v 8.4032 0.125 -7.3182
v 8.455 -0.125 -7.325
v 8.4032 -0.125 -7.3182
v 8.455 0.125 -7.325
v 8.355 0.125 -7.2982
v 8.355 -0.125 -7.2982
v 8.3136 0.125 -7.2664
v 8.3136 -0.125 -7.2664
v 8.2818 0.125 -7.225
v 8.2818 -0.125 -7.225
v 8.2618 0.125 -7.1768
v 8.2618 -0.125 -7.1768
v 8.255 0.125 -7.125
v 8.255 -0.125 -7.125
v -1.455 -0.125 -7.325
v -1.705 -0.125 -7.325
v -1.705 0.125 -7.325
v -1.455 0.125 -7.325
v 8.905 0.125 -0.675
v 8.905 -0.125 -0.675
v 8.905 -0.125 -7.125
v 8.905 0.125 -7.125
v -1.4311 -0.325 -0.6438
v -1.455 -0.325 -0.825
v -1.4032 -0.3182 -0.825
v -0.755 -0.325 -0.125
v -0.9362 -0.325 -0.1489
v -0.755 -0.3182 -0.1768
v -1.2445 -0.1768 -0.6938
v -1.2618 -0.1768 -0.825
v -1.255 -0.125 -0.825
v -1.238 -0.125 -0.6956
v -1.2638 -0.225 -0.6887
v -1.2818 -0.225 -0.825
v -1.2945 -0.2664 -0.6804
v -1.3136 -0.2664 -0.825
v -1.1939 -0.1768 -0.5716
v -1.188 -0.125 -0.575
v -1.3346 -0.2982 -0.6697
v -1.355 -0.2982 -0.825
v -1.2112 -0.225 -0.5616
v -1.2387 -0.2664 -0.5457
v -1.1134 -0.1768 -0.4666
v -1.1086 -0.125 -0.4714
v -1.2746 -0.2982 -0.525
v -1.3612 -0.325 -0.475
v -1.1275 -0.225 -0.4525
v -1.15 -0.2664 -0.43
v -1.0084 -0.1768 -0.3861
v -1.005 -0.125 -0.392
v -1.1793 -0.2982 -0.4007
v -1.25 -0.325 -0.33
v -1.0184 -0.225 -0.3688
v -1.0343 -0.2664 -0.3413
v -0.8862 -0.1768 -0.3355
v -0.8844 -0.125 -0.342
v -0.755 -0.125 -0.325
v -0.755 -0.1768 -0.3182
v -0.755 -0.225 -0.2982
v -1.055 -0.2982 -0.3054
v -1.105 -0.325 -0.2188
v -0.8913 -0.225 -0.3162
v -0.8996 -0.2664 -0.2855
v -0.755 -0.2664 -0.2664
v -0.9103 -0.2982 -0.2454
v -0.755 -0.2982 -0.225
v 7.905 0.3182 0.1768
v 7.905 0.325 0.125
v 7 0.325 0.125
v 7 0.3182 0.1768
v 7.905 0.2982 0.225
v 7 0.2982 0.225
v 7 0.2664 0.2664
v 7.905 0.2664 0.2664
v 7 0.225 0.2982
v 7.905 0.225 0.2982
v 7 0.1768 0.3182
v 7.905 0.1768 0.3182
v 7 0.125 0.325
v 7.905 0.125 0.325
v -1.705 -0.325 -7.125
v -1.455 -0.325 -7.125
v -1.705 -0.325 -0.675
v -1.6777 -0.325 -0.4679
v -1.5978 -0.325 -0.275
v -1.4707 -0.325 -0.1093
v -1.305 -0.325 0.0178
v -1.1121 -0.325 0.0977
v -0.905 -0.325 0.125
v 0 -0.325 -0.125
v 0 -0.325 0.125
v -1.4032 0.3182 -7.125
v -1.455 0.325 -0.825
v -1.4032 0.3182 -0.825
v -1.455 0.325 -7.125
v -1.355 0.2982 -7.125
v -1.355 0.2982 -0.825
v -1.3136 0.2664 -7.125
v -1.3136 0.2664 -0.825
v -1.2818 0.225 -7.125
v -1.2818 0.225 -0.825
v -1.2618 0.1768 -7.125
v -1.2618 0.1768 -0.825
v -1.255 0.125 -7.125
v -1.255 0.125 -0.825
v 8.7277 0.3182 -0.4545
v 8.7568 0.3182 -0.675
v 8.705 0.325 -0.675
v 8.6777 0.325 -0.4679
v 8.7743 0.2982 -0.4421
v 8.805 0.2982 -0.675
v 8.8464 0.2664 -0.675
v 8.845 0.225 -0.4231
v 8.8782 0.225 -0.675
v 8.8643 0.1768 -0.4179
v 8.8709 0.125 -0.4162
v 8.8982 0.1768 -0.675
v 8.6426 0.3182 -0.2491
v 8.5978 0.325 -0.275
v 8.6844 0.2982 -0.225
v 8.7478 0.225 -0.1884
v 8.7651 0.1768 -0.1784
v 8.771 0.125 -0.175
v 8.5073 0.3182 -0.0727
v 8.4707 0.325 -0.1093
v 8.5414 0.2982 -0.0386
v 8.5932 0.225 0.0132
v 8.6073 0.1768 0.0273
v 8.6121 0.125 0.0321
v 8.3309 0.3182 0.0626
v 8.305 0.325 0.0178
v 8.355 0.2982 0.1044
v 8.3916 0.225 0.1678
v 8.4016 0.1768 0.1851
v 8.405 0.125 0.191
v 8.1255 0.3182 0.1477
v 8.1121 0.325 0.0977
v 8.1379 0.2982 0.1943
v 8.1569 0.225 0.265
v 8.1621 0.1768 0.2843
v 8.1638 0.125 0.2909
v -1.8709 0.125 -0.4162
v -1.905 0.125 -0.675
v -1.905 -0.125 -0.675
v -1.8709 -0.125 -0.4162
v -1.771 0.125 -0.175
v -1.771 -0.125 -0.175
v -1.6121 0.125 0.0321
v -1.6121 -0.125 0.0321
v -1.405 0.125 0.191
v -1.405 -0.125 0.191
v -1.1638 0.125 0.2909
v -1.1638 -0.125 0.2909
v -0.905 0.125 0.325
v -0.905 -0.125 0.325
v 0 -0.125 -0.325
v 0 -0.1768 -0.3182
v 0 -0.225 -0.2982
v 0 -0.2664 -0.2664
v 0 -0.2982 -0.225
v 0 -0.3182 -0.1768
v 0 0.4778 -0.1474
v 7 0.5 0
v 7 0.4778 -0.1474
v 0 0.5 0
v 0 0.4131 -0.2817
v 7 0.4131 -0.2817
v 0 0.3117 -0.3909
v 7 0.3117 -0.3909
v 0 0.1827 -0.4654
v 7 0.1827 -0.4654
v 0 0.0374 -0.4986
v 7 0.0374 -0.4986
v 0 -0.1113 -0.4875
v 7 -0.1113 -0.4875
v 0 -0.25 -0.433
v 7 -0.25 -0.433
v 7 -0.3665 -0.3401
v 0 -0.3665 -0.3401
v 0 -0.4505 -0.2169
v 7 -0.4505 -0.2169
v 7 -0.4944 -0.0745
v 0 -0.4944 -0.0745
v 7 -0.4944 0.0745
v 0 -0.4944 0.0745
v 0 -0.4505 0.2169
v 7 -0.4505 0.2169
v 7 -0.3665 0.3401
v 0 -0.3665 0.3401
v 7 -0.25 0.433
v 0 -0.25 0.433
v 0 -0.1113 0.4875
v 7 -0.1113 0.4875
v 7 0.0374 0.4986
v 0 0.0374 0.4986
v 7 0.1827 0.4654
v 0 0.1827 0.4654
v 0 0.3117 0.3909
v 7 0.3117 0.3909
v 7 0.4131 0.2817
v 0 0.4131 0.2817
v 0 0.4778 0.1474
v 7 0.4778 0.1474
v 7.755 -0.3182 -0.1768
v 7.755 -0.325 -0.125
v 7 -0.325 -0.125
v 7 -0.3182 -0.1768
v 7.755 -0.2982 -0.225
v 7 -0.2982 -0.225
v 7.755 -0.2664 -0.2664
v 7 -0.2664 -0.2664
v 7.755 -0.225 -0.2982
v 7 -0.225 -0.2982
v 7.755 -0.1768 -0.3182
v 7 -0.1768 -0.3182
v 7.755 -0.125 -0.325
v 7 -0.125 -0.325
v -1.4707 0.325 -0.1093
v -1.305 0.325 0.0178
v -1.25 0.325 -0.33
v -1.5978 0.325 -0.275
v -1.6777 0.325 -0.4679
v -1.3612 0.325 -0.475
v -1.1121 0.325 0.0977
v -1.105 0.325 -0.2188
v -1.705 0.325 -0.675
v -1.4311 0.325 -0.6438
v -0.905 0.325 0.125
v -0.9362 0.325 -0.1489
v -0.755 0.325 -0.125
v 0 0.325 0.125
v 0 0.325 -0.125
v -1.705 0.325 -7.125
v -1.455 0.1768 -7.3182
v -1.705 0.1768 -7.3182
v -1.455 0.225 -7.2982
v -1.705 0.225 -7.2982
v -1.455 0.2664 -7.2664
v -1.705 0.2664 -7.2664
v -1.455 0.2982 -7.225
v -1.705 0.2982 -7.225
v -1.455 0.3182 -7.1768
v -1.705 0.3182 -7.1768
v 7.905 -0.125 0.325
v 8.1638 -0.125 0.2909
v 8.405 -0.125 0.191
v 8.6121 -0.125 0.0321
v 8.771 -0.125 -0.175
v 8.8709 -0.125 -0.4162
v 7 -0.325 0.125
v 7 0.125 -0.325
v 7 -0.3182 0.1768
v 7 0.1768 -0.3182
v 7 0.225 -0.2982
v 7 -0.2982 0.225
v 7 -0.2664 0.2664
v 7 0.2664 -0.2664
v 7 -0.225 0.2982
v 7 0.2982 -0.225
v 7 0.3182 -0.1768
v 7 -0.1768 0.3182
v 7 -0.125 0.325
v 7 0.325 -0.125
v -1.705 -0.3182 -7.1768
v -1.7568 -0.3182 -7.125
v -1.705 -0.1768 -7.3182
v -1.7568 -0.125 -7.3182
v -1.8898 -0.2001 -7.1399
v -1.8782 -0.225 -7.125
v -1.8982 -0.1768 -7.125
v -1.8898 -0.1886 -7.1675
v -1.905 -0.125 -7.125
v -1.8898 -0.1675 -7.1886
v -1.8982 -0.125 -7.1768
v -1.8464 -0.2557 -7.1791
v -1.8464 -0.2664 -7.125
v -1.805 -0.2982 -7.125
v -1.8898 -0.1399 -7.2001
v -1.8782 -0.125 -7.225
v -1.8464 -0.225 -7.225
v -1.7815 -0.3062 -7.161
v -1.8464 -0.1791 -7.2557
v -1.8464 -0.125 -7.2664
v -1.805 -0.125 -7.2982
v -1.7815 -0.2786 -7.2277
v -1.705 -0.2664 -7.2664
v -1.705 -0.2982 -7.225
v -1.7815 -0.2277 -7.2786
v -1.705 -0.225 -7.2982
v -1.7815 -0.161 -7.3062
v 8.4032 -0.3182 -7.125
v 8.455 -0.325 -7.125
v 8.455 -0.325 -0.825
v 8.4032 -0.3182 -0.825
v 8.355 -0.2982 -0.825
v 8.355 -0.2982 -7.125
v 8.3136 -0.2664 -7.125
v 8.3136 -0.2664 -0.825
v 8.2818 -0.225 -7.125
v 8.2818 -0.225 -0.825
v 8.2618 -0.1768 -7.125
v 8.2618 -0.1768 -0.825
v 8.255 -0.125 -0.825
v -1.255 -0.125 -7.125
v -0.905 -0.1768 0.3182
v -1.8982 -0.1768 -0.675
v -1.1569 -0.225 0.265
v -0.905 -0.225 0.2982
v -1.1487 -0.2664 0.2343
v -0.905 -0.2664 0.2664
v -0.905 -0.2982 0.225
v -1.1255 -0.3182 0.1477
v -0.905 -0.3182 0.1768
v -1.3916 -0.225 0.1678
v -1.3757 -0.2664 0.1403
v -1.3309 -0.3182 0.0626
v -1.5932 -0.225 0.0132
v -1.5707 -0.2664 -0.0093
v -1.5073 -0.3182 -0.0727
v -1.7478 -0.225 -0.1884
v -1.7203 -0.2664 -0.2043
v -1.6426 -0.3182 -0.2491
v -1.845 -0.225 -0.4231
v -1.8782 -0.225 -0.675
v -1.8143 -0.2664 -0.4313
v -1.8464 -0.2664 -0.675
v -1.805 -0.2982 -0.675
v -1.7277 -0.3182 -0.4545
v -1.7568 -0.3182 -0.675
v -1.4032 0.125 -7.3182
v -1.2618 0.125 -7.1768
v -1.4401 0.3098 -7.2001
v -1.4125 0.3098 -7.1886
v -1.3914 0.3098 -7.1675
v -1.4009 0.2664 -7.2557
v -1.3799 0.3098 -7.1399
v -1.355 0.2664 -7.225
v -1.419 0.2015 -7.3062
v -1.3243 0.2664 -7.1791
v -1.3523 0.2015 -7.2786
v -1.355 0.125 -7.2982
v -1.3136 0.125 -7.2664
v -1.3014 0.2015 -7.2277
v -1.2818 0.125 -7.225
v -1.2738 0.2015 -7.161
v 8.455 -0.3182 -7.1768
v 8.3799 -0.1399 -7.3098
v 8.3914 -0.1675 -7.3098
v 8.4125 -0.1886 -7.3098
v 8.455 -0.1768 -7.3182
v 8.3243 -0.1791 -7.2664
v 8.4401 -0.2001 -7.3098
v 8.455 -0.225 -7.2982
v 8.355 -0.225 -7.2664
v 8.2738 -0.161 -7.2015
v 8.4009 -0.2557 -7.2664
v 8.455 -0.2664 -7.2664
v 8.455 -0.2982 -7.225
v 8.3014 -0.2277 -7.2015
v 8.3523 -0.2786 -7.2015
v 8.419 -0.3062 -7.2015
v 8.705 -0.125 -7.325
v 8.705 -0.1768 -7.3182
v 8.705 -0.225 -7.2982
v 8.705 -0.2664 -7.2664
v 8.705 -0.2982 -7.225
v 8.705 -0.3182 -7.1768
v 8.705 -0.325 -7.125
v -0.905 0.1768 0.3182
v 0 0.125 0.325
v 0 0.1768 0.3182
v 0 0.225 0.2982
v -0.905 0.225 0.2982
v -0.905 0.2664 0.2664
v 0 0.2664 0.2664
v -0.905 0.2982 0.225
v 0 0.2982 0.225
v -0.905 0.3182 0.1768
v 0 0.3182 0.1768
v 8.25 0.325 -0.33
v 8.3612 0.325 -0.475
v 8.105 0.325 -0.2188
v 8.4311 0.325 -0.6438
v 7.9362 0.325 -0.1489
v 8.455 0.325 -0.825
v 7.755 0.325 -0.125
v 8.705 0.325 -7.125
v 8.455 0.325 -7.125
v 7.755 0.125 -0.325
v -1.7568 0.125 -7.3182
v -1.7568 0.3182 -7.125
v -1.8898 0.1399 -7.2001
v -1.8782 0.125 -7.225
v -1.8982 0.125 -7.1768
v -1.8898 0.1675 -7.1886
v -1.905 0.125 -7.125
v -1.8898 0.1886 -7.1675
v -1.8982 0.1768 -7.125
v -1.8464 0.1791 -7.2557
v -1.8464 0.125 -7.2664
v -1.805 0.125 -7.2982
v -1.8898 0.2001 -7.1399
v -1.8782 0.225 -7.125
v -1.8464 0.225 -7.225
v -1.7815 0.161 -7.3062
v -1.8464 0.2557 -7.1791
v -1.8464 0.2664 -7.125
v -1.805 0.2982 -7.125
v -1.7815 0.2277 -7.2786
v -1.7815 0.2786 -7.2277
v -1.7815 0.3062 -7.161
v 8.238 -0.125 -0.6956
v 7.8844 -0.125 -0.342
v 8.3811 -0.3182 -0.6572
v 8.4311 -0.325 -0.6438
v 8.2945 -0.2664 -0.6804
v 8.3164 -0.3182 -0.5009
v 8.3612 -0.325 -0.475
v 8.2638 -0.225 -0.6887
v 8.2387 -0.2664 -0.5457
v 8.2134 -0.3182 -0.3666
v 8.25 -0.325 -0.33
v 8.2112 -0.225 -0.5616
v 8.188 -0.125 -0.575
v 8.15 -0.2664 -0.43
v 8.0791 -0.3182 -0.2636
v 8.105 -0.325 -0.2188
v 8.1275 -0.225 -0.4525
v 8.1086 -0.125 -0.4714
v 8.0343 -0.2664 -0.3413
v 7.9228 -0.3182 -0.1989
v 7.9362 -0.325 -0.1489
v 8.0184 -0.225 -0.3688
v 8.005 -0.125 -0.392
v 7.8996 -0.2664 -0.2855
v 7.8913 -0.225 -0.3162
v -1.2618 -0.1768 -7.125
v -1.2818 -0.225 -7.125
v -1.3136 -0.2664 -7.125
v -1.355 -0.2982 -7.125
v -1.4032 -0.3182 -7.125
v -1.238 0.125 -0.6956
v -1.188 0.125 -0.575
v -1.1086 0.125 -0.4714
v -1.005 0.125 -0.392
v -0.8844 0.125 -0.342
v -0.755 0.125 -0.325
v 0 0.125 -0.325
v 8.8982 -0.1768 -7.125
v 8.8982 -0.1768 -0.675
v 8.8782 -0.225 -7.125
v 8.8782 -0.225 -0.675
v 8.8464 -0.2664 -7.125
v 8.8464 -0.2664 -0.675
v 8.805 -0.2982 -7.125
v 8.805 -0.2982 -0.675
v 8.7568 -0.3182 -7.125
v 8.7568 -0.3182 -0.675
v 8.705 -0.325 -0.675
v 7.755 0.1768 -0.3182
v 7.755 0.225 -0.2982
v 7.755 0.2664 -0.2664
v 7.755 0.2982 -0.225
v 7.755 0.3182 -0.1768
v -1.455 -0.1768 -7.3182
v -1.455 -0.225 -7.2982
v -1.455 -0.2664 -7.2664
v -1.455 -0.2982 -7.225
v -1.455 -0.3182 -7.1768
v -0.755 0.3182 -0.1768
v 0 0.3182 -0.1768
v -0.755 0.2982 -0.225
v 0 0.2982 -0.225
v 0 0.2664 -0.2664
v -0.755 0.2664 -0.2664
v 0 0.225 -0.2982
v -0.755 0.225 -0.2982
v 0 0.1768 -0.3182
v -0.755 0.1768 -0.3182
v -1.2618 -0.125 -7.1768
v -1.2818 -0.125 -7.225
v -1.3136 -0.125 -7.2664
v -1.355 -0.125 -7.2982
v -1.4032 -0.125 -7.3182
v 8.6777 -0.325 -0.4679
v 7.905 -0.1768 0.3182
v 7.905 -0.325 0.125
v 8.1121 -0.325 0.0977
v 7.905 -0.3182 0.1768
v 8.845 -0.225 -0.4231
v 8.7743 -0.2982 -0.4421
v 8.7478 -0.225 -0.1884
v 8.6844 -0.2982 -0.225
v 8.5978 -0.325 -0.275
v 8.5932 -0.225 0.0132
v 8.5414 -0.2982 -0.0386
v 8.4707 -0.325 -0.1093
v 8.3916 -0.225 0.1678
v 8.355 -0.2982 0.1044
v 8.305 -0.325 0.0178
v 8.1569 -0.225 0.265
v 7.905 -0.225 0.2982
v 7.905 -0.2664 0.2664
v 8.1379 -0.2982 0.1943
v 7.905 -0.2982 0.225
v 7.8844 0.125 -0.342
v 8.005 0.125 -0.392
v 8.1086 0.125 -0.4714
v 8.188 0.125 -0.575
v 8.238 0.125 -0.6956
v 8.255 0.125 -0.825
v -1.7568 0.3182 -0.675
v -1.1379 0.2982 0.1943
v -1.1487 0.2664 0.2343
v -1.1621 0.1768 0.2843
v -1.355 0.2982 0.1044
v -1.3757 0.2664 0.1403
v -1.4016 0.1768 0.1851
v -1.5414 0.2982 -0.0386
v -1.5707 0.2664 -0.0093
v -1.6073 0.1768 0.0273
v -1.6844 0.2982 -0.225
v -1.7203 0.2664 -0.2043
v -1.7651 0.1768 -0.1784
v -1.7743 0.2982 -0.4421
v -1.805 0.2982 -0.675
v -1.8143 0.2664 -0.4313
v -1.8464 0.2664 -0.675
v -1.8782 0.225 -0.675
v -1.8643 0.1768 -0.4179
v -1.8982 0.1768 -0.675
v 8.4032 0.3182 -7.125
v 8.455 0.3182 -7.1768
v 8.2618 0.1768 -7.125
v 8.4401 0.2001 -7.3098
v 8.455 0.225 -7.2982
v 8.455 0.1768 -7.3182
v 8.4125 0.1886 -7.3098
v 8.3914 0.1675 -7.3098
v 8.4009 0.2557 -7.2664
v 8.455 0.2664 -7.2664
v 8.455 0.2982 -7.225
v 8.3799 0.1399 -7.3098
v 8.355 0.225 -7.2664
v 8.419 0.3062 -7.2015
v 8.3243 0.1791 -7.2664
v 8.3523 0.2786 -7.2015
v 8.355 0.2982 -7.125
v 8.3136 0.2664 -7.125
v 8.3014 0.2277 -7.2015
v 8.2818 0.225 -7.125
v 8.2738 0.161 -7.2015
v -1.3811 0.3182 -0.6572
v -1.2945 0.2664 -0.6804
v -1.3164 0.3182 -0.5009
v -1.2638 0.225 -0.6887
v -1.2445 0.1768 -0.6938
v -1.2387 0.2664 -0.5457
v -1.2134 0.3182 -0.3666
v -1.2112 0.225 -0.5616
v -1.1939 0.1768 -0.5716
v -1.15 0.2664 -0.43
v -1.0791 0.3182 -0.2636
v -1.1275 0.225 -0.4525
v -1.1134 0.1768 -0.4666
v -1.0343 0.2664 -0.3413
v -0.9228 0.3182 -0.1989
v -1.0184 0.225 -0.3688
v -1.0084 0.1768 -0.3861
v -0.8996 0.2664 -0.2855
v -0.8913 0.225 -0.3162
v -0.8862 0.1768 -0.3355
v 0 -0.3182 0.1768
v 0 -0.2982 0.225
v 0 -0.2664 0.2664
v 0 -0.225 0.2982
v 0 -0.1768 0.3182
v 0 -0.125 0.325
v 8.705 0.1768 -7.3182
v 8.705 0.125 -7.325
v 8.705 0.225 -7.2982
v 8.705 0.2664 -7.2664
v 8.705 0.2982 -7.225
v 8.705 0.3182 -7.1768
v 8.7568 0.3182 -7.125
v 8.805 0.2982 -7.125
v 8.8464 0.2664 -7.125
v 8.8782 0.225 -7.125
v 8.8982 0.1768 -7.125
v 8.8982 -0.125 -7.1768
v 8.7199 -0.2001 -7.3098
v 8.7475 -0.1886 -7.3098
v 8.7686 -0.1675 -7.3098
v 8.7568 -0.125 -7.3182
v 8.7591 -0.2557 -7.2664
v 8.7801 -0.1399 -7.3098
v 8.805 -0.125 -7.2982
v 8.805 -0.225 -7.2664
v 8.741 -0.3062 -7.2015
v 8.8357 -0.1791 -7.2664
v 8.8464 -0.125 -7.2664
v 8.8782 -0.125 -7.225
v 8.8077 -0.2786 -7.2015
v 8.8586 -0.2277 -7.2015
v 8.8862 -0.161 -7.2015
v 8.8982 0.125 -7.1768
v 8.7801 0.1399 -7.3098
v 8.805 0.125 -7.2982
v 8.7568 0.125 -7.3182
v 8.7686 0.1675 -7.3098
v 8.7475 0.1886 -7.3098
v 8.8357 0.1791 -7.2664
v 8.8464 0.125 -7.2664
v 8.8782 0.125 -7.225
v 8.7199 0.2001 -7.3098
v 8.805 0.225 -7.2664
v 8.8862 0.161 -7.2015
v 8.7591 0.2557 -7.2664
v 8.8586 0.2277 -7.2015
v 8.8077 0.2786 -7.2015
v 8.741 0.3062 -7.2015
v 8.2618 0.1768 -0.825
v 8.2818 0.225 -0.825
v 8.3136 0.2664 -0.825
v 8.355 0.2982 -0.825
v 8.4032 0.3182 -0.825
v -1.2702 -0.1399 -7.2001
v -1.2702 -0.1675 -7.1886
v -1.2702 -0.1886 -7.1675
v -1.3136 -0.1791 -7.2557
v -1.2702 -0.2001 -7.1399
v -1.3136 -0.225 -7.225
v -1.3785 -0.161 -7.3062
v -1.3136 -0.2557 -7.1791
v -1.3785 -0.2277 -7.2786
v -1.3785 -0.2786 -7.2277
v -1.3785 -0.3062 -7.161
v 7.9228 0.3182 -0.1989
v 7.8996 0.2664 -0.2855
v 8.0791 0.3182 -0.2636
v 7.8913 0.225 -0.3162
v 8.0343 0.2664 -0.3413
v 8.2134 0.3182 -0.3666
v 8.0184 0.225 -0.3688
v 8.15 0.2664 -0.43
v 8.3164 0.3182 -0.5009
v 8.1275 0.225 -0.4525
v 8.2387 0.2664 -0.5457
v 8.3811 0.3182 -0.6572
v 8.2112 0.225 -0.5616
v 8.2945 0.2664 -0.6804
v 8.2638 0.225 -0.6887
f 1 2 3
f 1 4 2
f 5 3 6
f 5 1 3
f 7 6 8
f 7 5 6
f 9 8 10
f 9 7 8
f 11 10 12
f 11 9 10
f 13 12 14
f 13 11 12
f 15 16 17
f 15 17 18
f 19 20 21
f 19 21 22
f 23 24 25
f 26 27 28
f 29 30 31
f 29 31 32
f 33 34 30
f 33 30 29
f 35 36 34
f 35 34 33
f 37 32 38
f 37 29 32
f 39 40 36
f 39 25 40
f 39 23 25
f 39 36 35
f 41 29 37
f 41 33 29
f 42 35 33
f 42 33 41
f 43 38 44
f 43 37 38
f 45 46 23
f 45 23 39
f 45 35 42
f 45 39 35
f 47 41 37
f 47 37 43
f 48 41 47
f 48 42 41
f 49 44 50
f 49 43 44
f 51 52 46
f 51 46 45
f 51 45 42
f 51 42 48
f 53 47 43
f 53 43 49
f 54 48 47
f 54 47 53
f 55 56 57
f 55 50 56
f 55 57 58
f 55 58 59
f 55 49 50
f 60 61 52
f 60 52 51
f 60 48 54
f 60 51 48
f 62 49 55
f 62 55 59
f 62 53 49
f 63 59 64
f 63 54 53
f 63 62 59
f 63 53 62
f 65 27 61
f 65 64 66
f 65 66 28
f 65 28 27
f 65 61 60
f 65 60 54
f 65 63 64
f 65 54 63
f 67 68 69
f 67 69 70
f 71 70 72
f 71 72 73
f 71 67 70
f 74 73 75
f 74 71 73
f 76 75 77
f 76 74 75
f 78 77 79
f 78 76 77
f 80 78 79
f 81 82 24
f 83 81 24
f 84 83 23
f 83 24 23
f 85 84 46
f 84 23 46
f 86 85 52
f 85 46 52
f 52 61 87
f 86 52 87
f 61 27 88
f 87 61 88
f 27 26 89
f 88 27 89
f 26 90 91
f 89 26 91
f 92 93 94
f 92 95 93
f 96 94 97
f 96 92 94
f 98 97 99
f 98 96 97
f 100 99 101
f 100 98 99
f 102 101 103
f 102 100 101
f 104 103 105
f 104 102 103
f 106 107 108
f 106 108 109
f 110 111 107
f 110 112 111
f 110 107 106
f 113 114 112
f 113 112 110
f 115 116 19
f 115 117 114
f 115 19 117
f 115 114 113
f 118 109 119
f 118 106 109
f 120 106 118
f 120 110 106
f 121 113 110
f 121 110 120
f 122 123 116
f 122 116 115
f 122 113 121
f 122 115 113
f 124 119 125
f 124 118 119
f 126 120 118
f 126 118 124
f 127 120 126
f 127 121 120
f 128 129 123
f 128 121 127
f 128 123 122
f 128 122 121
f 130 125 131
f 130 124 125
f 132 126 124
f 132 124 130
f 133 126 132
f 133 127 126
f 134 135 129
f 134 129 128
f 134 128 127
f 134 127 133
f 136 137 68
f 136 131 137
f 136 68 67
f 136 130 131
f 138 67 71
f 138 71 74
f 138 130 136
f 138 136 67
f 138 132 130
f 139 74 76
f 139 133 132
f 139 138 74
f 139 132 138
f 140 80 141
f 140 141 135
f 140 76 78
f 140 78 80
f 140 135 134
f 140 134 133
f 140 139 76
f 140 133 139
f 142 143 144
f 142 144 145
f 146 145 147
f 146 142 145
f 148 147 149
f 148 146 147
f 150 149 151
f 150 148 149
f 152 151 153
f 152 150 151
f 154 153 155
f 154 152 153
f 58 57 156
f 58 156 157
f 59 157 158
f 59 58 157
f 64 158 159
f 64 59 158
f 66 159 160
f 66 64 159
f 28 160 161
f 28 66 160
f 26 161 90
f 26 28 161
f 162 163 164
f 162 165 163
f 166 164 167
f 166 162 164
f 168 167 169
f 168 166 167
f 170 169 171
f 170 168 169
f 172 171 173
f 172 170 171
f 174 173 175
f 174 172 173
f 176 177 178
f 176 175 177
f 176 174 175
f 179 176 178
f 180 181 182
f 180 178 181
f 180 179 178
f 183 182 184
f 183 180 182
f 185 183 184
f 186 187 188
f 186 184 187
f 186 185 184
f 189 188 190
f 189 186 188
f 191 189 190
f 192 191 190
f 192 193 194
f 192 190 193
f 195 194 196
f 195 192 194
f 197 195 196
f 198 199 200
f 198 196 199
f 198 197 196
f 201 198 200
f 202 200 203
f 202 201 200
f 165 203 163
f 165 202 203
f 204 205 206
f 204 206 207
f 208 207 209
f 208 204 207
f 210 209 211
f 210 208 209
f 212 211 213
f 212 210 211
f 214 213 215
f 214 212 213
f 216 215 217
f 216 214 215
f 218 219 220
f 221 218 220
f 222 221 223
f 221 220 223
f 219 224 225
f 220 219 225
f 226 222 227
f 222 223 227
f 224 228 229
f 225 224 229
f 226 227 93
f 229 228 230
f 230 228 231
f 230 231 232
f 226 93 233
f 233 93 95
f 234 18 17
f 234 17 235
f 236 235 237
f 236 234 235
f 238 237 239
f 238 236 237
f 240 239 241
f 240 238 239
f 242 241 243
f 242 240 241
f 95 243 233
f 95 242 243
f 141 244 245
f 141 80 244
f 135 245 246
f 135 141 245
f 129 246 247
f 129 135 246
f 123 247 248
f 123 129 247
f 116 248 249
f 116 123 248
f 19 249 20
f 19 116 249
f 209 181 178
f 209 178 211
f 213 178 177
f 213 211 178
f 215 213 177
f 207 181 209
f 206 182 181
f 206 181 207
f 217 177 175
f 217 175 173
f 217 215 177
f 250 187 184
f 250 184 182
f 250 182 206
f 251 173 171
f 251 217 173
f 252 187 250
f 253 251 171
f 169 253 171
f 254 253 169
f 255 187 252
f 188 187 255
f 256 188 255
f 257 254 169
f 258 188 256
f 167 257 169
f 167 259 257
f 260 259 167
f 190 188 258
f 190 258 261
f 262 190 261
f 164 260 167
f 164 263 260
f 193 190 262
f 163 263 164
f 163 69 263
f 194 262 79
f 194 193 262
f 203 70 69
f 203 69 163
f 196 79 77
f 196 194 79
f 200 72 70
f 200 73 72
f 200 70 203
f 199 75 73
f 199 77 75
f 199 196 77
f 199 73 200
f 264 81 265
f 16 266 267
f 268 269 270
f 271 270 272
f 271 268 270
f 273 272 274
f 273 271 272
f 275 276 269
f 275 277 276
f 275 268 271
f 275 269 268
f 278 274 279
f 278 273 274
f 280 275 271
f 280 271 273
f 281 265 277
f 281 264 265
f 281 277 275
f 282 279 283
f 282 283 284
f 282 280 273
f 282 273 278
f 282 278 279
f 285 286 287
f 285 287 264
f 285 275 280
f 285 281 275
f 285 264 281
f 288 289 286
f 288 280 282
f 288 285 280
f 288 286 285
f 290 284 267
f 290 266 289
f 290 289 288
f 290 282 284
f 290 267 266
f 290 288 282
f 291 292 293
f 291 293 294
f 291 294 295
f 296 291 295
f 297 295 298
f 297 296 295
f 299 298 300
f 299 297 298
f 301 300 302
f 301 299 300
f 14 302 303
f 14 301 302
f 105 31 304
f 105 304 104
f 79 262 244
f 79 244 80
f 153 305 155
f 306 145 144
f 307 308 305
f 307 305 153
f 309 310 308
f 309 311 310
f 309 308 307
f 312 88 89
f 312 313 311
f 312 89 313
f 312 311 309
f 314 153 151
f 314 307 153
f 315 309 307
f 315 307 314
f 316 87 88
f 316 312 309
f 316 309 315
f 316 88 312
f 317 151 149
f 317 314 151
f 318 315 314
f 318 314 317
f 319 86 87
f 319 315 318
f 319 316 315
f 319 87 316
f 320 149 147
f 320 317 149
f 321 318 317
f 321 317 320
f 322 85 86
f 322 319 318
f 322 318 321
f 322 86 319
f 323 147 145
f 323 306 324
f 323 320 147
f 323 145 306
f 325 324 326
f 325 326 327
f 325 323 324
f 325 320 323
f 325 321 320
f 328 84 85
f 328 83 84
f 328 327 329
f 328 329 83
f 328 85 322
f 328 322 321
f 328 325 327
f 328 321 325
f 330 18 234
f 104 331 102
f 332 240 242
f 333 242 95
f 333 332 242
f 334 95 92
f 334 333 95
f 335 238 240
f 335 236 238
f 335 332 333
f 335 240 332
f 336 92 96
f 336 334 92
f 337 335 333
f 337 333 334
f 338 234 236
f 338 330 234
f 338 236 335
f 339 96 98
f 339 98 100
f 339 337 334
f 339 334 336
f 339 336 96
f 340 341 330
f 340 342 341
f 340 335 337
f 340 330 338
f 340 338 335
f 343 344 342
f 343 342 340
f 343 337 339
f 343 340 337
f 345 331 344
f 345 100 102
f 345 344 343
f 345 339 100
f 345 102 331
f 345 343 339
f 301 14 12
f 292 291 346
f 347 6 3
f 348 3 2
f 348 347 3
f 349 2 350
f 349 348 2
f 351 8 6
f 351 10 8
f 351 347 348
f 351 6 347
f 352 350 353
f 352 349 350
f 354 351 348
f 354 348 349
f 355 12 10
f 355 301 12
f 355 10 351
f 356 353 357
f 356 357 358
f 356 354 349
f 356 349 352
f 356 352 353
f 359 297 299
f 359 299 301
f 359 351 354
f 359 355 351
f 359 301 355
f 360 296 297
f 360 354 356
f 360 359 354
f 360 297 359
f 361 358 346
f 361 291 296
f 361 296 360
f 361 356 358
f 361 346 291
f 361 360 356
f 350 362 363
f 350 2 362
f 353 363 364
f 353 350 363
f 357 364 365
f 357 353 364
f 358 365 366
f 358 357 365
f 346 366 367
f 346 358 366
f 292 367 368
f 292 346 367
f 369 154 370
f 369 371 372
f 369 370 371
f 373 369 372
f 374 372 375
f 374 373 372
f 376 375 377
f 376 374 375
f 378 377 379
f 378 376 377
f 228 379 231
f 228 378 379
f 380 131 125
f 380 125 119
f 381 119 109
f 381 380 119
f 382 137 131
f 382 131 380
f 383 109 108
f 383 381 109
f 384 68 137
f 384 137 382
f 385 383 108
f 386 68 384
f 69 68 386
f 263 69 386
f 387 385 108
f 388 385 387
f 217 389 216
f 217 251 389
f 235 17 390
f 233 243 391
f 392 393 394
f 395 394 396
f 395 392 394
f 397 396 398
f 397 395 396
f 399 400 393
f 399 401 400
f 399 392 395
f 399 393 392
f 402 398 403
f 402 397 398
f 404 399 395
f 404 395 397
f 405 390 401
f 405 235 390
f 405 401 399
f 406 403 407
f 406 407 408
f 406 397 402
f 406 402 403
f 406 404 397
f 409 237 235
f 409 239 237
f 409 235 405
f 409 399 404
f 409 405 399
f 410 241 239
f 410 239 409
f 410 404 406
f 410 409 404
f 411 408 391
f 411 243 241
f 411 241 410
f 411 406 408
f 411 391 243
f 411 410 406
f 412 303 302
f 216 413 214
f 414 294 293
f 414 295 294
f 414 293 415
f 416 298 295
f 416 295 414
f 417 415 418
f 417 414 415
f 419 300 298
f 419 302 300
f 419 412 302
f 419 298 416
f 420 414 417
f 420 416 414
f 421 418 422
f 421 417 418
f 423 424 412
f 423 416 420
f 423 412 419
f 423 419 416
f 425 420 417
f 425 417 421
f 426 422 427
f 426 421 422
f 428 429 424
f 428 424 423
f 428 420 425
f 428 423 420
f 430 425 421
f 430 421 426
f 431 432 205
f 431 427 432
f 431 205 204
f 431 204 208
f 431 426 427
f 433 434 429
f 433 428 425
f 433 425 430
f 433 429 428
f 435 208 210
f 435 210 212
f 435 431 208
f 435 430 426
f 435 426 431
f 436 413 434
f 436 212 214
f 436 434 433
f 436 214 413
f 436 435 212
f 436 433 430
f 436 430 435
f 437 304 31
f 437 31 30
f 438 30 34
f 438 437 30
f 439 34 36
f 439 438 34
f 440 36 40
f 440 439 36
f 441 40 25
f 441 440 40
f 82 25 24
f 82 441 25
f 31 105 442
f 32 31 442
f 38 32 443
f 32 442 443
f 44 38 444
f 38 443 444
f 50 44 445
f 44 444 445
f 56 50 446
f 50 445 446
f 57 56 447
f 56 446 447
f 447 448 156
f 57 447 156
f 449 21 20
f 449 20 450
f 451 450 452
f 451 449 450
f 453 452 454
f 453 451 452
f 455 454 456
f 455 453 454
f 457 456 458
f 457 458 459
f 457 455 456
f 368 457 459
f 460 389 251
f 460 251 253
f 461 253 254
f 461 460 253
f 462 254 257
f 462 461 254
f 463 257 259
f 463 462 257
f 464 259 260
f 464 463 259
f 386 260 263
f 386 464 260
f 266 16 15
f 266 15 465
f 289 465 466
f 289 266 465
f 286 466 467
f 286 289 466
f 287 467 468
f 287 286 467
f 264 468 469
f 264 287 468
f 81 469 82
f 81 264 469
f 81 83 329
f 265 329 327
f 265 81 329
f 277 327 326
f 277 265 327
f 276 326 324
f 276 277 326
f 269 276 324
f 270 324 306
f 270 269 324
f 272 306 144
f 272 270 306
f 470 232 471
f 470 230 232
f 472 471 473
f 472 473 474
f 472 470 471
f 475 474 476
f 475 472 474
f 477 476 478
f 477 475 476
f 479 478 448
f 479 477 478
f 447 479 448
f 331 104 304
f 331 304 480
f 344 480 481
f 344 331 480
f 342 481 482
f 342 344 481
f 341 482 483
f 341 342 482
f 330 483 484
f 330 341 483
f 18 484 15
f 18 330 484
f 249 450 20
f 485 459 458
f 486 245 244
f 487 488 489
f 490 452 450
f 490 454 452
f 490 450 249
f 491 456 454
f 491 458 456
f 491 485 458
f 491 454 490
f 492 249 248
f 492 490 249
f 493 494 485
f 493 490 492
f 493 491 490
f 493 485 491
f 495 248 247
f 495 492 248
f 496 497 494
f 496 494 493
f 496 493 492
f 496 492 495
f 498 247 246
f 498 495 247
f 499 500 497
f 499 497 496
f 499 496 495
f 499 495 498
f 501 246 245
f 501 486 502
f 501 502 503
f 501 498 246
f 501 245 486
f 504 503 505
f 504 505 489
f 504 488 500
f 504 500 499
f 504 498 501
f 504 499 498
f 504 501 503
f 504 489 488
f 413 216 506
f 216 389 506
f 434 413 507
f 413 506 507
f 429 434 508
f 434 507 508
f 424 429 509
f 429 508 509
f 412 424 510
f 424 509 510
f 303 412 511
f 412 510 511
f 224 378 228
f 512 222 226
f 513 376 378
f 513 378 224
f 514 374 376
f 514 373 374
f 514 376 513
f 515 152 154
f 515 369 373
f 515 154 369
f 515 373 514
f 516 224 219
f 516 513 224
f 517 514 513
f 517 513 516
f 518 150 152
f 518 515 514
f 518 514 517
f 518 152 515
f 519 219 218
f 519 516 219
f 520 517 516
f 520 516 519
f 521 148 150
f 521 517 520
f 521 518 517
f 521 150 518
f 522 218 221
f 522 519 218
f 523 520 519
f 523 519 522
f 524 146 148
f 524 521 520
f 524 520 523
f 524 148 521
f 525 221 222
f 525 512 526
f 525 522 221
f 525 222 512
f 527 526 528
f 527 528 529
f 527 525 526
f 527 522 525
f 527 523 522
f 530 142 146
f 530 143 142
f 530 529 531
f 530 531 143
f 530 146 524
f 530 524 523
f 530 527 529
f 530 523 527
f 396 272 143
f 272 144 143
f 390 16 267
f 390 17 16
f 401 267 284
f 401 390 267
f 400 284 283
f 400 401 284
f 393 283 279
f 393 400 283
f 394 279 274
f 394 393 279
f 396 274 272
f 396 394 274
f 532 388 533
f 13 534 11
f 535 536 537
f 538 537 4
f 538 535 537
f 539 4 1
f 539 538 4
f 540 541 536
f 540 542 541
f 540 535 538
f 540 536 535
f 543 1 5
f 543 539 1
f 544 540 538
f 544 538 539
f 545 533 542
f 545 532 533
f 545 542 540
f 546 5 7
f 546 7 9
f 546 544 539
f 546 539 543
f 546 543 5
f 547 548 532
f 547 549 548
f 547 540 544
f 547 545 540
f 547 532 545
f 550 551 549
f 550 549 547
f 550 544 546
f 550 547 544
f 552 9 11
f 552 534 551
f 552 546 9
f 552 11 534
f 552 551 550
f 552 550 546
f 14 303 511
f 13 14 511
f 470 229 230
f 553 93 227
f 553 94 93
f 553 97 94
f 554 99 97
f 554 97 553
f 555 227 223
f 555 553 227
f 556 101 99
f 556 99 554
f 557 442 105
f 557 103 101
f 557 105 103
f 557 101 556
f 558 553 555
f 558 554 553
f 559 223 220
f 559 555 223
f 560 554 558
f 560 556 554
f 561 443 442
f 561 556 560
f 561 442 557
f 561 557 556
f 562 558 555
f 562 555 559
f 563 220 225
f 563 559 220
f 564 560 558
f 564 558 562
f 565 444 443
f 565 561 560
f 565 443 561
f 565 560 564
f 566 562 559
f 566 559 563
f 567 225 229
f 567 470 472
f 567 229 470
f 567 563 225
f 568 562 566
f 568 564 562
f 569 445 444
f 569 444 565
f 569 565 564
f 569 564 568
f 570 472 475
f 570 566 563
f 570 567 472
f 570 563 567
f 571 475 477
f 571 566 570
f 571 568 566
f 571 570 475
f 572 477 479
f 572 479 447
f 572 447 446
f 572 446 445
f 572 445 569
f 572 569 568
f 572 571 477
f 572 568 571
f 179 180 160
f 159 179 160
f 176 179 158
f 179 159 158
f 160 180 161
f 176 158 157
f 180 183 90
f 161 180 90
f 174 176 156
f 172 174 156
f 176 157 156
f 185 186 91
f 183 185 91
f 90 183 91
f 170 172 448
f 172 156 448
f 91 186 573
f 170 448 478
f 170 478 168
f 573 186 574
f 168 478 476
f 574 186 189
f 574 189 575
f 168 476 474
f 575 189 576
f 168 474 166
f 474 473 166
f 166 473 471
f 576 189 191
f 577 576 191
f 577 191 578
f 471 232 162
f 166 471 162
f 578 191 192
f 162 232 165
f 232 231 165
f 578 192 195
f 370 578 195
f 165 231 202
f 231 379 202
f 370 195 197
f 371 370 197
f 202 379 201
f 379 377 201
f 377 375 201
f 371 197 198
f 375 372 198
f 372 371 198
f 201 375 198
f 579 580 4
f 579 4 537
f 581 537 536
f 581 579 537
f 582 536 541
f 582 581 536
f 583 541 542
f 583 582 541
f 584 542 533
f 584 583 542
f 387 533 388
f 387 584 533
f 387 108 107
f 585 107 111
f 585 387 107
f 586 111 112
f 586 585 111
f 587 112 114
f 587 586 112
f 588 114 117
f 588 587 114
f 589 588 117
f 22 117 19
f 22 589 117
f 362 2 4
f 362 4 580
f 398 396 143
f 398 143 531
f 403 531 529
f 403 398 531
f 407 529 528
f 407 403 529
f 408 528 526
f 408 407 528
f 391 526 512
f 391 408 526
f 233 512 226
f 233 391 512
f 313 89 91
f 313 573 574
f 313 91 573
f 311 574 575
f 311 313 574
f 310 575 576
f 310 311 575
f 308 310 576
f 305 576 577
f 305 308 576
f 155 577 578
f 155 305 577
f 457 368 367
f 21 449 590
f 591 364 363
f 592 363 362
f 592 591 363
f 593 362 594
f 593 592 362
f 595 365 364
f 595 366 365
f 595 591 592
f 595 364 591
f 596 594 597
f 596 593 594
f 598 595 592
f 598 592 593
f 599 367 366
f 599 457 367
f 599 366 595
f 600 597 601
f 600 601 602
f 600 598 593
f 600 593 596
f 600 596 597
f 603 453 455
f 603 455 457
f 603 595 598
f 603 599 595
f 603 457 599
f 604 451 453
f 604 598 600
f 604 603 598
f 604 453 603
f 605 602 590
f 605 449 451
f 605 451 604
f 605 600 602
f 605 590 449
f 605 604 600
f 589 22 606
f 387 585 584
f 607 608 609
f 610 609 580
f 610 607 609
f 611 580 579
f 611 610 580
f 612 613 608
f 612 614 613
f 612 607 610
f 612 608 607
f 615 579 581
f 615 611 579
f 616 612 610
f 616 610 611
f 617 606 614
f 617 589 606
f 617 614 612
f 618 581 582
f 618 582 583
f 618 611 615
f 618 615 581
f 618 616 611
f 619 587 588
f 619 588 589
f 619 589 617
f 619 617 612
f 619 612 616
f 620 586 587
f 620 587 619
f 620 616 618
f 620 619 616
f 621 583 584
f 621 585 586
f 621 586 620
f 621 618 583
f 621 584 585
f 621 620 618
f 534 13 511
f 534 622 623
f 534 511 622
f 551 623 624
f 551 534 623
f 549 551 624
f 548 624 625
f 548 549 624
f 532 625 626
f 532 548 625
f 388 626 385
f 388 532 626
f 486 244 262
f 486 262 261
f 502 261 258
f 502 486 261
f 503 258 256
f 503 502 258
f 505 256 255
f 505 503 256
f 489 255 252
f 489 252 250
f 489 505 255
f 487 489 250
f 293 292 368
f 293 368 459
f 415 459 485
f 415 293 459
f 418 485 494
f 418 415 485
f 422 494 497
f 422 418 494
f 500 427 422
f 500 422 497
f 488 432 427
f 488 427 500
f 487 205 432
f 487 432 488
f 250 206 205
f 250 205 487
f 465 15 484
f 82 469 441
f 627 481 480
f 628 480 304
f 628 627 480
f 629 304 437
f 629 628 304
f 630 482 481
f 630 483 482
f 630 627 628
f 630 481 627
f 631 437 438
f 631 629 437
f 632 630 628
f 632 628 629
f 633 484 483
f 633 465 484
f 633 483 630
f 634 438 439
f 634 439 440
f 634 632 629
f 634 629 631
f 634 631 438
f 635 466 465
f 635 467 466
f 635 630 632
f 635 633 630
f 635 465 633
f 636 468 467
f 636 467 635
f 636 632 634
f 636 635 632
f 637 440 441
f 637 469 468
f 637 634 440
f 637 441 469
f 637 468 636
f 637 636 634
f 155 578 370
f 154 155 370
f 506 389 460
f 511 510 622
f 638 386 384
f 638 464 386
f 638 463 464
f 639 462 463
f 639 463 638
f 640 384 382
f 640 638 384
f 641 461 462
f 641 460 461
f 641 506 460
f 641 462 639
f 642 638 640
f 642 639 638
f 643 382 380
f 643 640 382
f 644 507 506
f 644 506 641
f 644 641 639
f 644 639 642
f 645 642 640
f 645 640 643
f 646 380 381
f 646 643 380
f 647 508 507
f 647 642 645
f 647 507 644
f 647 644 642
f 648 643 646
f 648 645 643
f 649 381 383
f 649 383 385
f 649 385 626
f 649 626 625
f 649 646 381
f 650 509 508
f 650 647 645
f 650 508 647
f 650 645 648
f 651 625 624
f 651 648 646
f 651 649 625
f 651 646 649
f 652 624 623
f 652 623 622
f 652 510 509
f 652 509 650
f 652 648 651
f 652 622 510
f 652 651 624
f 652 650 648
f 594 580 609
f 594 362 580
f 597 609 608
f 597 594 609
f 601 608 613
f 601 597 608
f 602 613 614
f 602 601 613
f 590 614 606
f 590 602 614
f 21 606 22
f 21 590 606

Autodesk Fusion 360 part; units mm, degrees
sketch "Sketch1" plane through (0, 0, 0) normal (1, 0, 0) x (0, 1, 0)
  circle A0 centre (0, 0) radius 0.5
  line L0 (0.325, -0.325) -> (-0.325, -0.325)
  line L1 (-0.325, -0.325) -> (-0.325, 0.325)
  line L2 (-0.325, 0.325) -> (0.325, 0.325)
  line L3 (0.325, 0.325) -> (0.325, -0.325)
  line L4 (0.325, -0.325) -> (-0.325, 0.325) construction
  line L5 (-0.325, -0.325) -> (0.325, 0.325) construction
  dimension "d1" = 1
  dimension "d2" = 0.65
  dimension "d3" = 0.65
extrude "Extrude1" add sketch "Sketch1" along normal blind 7 contours A0 | L0 L1 L2 L3
sketch "Sketch2" plane through (7, 0, 0) normal (1, 0, 0) x (0, 1, 0)
  circle A0 centre (0, 0) radius 0.5
  line L0 (0.325, -0.325) -> (-0.325, -0.325)
  line L1 (-0.325, -0.325) -> (-0.325, 0.325)
  line L2 (-0.325, 0.325) -> (0.325, 0.325)
  line L3 (0.325, 0.325) -> (0.325, -0.325)
  line L4 (0.325, -0.325) -> (-0.325, 0.325) construction
  line L5 (-0.325, -0.325) -> (0.325, 0.325) construction
  dimension "d8" = 0.65
  dimension "d9" = 0.65
extrude "Extrude2" add sketch "Sketch2" along normal blind 1.905 contours L0 L1 L2 L3
extrude "Extrude3" add sketch "Sketch1" against normal blind 1.905 contours L0 L1 L2 L3
sketch "Sketch3" plane through (0, 0, -0.325) normal (0, 0, -1) x (1, 0, 0)
  line L0 (7, 0.325) -> (7, -0.325)
  line L1 (7, -0.325) -> (8.905, -0.325)
  line L2 (8.905, -0.325) -> (8.905, 0.325)
  line L3 (8.905, 0.325) -> (7, 0.325)
  line L4 (8.905, 0.325) -> (8.255, 0.325)
  line L5 (8.255, 0.325) -> (8.255, -0.325)
  line L6 (8.255, -0.325) -> (8.905, -0.325)
  line L7 (8.905, -0.325) -> (8.905, 0.325)
  line L8 (8.905, 0.325) -> (8.255, -0.325) construction
  line L9 (8.255, 0.325) -> (8.905, -0.325) construction
  point P0 (8.58, 0)
  dimension "d14" = 0.65
  dimension "d15" = 0.65
sketch "Sketch4" plane through (0, 0, -0.325) normal (0, 0, -1) x (1, 0, 0)
  line L0 (0, -0.325) -> (0, 0.325)
  line L1 (0, 0.325) -> (-1.905, 0.325)
  line L2 (-1.905, 0.325) -> (-1.905, -0.325)
  line L3 (-1.905, -0.325) -> (0, -0.325)
  line L4 (-1.255, -0.325) -> (-1.905, -0.325)
  line L5 (-1.905, -0.325) -> (-1.905, 0.325)
  line L6 (-1.905, 0.325) -> (-1.255, 0.325)
  line L7 (-1.255, 0.325) -> (-1.255, -0.325)
  line L8 (-1.255, -0.325) -> (-1.905, 0.325) construction
  line L9 (-1.905, -0.325) -> (-1.255, 0.325) construction
  point P0 (-1.58, 0)
  dimension "d17" = 0.65
  dimension "d18" = 0.65
extrude "Extrude4" add sketch "Sketch4" sketch "Sketch3" along normal blind 7 contours L1 L2 L3 L4 L5 L6 L7 of sketch 2 contours L1 L2 L3 L4 L5 L6 L7
fillet "Fillet1" radius 0.5 2 edges at (-1.255, 0, -0.325) (8.255, 0, -0.325)
fillet "Fillet2" radius 1 2 edges at (-1.905, 0, 0.325) (8.905, 0, 0.325)
fillet "Fillet3" radius 0.2 32 edges at (-1.58, -0.325, -7.325) (-1.255, 0, -7.325) (-1.58, 0.325, -7.325) (-1.905, 0, -7.325) (-1.1086, -0.325, -0.4714) (-1.255, -0.325, -4.075) (-0.3775, -0.325, -0.325) (-0.4525, -0.325, 0.325) (-1.6121, -0.325, 0.0321) (-1.905, -0.325, -4) (-0.4525, 0.325, 0.325) (-1.6121, 0.325, 0.0321) (-1.905, 0.325, -4) (-1.1086, 0.325, -0.4714) (-0.3775, 0.325, -0.325) (-1.255, 0.325, -4.075) (7.4525, -0.325, 0.325) (8.6121, -0.325, 0.0321) (8.905, -0.325, -4) (8.255, -0.325, -4.075) (8.1086, -0.325, -0.4714) (7.3775, -0.325, -0.325) (8.905, 0.325, -4) (8.6121, 0.325, 0.0321) (7.4525, 0.325, 0.325) (8.1086, 0.325, -0.4714) (8.255, 0.325, -4.075) (7.3775, 0.325, -0.325) (8.58, 0.325, -7.325) (8.905, 0, -7.325) (8.58, -0.325, -7.325) (8.255, 0, -7.325)
equation "d1 = jumperWidth"
equation "d2 = d3"
equation "d3 = d1 * 0.65"
equation "jumperWidth = 1 mm"
equation "jumperBaseLenght = 7 mm"
equation "d6 = jumperBaseLenght"
equation "d8 = jumperWidth * 0.65"
equation "d9 = d8"
equation "d10 = ( ( 2.54 * ceil(( jumperBaseLenght + 1.3 * jumperWidth ) / 2.54 mm) ) * 1 mm + 0.65 * jumperWidth - jumperBaseLenght ) / 2"
equation "d12 = -( ( 2.54 * ceil(( jumperBaseLenght + 1.3 * jumperWidth ) / 2.54 mm) ) * 1 mm + 0.65 * jumperWidth - jumperBaseLenght ) / 2"
equation "d14 = jumperWidth * 0.65"
equation "d15 = d14"
equation "d17 = jumperWidth * 0.65"
equation "d18 = d17"
equation "d26 = 0.2 * jumperWidth"
